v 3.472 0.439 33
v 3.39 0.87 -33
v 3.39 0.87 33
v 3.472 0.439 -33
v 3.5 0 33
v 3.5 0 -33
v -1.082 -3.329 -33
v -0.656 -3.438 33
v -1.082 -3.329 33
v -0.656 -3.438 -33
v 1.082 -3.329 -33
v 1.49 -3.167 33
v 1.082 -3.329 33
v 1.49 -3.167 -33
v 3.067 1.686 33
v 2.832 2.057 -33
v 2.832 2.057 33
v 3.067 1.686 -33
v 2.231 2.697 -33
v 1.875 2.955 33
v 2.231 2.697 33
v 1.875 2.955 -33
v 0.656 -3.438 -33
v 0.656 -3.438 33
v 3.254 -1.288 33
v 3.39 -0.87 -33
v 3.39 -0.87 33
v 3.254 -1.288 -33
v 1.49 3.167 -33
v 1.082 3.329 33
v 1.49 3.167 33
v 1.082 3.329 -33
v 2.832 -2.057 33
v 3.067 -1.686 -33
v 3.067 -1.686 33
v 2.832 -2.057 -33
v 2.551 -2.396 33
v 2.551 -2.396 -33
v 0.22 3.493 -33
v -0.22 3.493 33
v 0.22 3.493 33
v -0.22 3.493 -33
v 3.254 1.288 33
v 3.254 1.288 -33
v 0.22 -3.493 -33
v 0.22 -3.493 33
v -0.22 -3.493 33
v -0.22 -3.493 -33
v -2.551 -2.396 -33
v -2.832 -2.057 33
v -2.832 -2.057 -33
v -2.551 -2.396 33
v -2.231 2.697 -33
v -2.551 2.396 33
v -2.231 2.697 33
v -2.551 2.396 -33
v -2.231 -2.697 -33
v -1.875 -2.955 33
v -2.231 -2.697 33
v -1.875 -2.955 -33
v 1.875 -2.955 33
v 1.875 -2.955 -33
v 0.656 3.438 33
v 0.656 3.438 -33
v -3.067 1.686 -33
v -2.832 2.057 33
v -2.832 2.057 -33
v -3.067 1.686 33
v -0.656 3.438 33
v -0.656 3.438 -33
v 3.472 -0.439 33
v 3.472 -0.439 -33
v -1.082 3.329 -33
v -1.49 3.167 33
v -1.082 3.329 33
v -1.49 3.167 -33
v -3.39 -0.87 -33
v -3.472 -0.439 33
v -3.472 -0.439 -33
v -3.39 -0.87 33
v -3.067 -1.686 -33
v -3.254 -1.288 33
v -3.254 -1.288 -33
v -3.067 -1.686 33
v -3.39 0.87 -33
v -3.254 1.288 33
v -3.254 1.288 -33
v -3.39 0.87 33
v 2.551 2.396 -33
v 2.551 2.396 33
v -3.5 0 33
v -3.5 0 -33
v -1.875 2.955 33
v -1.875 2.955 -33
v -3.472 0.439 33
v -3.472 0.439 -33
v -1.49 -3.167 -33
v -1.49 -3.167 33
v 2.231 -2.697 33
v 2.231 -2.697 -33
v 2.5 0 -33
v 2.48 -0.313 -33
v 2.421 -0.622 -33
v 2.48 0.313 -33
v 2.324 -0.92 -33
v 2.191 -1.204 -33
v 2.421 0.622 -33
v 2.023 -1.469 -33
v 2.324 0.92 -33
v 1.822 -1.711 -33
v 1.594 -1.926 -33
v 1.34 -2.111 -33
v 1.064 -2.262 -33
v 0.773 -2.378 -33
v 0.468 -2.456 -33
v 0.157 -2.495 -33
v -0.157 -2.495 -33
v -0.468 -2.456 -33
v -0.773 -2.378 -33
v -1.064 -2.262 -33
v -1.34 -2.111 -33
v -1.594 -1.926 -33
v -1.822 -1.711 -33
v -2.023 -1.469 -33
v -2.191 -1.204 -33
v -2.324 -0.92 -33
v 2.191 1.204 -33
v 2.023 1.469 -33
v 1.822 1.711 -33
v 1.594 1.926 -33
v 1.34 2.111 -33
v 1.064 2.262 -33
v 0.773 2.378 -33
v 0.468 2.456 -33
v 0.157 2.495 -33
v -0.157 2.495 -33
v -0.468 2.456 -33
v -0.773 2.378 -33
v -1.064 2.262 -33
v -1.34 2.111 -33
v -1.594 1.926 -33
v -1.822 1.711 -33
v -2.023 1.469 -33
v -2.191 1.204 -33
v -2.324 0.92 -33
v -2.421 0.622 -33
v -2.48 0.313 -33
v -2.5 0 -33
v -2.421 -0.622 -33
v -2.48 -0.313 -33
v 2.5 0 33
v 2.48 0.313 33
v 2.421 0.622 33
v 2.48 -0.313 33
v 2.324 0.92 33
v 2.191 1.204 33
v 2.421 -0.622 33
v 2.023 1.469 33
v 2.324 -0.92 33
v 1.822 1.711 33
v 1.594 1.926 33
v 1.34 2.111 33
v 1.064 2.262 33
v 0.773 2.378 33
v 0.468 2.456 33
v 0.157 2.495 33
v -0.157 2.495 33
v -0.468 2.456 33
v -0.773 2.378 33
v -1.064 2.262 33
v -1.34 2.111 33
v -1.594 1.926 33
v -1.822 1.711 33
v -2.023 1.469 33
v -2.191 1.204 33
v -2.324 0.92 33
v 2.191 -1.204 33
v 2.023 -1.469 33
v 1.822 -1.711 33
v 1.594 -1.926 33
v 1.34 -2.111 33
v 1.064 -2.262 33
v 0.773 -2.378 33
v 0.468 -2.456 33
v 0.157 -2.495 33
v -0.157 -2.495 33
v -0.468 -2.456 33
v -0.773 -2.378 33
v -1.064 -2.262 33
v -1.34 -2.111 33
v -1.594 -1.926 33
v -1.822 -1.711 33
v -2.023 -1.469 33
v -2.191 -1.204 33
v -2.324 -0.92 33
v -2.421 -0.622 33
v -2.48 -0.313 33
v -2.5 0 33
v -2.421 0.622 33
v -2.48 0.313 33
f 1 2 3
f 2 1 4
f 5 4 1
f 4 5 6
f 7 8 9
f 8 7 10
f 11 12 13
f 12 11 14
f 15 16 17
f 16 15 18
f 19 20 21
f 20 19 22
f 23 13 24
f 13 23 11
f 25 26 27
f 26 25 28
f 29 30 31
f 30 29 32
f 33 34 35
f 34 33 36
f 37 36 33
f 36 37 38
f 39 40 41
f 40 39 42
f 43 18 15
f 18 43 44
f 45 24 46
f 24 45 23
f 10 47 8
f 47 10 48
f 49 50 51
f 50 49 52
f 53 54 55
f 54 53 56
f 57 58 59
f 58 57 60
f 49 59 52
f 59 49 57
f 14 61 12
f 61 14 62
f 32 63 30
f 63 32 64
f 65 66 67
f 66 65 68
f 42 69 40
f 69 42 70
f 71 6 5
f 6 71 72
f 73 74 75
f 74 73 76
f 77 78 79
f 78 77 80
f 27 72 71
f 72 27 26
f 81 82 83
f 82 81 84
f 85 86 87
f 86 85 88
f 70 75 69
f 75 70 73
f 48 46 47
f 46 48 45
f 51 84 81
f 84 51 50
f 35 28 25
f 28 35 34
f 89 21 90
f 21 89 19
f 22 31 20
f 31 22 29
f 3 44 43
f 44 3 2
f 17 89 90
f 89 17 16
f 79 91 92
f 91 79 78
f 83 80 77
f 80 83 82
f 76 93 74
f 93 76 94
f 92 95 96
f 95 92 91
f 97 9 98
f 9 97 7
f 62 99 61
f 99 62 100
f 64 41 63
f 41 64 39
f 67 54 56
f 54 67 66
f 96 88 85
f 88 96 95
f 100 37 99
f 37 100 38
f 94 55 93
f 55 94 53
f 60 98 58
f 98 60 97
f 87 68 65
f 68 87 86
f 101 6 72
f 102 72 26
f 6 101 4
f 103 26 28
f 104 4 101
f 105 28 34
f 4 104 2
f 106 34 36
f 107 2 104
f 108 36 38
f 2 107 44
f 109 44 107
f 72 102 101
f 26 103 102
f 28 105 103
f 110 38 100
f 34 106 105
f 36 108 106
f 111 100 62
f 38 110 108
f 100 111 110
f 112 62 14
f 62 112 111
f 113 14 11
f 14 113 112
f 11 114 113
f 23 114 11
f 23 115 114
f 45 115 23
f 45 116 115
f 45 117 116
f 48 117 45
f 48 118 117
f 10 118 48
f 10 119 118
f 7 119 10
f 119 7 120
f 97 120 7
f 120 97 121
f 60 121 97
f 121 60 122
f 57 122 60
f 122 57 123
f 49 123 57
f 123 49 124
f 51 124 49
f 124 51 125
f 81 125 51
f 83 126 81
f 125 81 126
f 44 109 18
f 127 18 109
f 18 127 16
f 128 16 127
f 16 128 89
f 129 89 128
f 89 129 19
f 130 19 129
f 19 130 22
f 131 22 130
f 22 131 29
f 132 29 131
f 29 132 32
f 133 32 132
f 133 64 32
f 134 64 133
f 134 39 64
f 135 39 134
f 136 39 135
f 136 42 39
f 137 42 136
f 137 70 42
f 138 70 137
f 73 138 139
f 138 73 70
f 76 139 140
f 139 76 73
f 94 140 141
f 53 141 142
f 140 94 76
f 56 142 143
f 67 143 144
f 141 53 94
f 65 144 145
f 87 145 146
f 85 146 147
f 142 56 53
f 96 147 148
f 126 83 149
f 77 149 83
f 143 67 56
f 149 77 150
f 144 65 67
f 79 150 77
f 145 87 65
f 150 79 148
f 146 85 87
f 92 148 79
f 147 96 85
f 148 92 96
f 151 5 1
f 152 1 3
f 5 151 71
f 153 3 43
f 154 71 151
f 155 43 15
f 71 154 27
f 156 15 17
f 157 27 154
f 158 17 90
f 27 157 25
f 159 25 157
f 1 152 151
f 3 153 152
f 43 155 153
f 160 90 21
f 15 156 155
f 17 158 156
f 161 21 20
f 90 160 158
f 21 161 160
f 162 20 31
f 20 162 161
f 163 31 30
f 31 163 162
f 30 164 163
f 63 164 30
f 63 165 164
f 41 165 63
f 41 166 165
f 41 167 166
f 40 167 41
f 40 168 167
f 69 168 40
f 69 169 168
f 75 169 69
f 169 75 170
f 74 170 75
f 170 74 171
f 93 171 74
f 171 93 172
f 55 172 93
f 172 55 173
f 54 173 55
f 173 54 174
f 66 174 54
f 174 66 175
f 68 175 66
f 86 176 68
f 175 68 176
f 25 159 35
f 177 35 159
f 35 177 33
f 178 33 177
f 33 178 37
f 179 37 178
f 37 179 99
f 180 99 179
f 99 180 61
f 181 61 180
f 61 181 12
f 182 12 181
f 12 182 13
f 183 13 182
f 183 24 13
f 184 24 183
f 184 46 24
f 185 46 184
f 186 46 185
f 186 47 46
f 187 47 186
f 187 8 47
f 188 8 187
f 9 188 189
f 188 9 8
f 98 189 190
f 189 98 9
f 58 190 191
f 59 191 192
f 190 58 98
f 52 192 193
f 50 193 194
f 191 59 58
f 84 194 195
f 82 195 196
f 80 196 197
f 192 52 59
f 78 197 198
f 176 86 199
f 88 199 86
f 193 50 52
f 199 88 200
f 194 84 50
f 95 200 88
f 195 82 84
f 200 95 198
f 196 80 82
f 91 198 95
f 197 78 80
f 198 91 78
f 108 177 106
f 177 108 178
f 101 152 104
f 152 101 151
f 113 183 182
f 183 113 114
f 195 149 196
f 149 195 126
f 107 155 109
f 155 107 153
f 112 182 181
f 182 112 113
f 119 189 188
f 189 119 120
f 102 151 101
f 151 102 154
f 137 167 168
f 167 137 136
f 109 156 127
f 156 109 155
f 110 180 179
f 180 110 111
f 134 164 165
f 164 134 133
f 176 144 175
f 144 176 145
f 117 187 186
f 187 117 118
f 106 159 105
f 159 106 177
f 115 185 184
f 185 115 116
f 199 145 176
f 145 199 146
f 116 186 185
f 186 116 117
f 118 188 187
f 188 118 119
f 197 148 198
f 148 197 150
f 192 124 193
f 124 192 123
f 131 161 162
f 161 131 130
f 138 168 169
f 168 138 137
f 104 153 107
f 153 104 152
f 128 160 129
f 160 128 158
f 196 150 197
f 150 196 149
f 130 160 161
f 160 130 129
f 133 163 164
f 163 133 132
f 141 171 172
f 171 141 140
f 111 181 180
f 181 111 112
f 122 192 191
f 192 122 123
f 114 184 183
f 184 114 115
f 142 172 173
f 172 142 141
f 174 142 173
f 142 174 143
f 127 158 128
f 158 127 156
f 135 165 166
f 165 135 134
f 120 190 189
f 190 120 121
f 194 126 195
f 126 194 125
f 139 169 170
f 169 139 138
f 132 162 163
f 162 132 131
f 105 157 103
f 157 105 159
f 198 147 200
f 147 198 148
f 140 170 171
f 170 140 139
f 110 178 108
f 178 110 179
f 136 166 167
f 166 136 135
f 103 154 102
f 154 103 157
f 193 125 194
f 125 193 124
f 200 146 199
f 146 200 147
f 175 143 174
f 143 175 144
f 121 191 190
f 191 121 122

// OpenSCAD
$fn = 50;


difference() {
	union() {
		translate(v = [0, 0, -33.0000000000]) {
			cylinder(h = 66, r = 3.5000000000);
		}
	}
	union() {
		translate(v = [0, 0, -100.0000000000]) {
			cylinder(h = 200, r = 2.5000000000);
		}
	}
}
